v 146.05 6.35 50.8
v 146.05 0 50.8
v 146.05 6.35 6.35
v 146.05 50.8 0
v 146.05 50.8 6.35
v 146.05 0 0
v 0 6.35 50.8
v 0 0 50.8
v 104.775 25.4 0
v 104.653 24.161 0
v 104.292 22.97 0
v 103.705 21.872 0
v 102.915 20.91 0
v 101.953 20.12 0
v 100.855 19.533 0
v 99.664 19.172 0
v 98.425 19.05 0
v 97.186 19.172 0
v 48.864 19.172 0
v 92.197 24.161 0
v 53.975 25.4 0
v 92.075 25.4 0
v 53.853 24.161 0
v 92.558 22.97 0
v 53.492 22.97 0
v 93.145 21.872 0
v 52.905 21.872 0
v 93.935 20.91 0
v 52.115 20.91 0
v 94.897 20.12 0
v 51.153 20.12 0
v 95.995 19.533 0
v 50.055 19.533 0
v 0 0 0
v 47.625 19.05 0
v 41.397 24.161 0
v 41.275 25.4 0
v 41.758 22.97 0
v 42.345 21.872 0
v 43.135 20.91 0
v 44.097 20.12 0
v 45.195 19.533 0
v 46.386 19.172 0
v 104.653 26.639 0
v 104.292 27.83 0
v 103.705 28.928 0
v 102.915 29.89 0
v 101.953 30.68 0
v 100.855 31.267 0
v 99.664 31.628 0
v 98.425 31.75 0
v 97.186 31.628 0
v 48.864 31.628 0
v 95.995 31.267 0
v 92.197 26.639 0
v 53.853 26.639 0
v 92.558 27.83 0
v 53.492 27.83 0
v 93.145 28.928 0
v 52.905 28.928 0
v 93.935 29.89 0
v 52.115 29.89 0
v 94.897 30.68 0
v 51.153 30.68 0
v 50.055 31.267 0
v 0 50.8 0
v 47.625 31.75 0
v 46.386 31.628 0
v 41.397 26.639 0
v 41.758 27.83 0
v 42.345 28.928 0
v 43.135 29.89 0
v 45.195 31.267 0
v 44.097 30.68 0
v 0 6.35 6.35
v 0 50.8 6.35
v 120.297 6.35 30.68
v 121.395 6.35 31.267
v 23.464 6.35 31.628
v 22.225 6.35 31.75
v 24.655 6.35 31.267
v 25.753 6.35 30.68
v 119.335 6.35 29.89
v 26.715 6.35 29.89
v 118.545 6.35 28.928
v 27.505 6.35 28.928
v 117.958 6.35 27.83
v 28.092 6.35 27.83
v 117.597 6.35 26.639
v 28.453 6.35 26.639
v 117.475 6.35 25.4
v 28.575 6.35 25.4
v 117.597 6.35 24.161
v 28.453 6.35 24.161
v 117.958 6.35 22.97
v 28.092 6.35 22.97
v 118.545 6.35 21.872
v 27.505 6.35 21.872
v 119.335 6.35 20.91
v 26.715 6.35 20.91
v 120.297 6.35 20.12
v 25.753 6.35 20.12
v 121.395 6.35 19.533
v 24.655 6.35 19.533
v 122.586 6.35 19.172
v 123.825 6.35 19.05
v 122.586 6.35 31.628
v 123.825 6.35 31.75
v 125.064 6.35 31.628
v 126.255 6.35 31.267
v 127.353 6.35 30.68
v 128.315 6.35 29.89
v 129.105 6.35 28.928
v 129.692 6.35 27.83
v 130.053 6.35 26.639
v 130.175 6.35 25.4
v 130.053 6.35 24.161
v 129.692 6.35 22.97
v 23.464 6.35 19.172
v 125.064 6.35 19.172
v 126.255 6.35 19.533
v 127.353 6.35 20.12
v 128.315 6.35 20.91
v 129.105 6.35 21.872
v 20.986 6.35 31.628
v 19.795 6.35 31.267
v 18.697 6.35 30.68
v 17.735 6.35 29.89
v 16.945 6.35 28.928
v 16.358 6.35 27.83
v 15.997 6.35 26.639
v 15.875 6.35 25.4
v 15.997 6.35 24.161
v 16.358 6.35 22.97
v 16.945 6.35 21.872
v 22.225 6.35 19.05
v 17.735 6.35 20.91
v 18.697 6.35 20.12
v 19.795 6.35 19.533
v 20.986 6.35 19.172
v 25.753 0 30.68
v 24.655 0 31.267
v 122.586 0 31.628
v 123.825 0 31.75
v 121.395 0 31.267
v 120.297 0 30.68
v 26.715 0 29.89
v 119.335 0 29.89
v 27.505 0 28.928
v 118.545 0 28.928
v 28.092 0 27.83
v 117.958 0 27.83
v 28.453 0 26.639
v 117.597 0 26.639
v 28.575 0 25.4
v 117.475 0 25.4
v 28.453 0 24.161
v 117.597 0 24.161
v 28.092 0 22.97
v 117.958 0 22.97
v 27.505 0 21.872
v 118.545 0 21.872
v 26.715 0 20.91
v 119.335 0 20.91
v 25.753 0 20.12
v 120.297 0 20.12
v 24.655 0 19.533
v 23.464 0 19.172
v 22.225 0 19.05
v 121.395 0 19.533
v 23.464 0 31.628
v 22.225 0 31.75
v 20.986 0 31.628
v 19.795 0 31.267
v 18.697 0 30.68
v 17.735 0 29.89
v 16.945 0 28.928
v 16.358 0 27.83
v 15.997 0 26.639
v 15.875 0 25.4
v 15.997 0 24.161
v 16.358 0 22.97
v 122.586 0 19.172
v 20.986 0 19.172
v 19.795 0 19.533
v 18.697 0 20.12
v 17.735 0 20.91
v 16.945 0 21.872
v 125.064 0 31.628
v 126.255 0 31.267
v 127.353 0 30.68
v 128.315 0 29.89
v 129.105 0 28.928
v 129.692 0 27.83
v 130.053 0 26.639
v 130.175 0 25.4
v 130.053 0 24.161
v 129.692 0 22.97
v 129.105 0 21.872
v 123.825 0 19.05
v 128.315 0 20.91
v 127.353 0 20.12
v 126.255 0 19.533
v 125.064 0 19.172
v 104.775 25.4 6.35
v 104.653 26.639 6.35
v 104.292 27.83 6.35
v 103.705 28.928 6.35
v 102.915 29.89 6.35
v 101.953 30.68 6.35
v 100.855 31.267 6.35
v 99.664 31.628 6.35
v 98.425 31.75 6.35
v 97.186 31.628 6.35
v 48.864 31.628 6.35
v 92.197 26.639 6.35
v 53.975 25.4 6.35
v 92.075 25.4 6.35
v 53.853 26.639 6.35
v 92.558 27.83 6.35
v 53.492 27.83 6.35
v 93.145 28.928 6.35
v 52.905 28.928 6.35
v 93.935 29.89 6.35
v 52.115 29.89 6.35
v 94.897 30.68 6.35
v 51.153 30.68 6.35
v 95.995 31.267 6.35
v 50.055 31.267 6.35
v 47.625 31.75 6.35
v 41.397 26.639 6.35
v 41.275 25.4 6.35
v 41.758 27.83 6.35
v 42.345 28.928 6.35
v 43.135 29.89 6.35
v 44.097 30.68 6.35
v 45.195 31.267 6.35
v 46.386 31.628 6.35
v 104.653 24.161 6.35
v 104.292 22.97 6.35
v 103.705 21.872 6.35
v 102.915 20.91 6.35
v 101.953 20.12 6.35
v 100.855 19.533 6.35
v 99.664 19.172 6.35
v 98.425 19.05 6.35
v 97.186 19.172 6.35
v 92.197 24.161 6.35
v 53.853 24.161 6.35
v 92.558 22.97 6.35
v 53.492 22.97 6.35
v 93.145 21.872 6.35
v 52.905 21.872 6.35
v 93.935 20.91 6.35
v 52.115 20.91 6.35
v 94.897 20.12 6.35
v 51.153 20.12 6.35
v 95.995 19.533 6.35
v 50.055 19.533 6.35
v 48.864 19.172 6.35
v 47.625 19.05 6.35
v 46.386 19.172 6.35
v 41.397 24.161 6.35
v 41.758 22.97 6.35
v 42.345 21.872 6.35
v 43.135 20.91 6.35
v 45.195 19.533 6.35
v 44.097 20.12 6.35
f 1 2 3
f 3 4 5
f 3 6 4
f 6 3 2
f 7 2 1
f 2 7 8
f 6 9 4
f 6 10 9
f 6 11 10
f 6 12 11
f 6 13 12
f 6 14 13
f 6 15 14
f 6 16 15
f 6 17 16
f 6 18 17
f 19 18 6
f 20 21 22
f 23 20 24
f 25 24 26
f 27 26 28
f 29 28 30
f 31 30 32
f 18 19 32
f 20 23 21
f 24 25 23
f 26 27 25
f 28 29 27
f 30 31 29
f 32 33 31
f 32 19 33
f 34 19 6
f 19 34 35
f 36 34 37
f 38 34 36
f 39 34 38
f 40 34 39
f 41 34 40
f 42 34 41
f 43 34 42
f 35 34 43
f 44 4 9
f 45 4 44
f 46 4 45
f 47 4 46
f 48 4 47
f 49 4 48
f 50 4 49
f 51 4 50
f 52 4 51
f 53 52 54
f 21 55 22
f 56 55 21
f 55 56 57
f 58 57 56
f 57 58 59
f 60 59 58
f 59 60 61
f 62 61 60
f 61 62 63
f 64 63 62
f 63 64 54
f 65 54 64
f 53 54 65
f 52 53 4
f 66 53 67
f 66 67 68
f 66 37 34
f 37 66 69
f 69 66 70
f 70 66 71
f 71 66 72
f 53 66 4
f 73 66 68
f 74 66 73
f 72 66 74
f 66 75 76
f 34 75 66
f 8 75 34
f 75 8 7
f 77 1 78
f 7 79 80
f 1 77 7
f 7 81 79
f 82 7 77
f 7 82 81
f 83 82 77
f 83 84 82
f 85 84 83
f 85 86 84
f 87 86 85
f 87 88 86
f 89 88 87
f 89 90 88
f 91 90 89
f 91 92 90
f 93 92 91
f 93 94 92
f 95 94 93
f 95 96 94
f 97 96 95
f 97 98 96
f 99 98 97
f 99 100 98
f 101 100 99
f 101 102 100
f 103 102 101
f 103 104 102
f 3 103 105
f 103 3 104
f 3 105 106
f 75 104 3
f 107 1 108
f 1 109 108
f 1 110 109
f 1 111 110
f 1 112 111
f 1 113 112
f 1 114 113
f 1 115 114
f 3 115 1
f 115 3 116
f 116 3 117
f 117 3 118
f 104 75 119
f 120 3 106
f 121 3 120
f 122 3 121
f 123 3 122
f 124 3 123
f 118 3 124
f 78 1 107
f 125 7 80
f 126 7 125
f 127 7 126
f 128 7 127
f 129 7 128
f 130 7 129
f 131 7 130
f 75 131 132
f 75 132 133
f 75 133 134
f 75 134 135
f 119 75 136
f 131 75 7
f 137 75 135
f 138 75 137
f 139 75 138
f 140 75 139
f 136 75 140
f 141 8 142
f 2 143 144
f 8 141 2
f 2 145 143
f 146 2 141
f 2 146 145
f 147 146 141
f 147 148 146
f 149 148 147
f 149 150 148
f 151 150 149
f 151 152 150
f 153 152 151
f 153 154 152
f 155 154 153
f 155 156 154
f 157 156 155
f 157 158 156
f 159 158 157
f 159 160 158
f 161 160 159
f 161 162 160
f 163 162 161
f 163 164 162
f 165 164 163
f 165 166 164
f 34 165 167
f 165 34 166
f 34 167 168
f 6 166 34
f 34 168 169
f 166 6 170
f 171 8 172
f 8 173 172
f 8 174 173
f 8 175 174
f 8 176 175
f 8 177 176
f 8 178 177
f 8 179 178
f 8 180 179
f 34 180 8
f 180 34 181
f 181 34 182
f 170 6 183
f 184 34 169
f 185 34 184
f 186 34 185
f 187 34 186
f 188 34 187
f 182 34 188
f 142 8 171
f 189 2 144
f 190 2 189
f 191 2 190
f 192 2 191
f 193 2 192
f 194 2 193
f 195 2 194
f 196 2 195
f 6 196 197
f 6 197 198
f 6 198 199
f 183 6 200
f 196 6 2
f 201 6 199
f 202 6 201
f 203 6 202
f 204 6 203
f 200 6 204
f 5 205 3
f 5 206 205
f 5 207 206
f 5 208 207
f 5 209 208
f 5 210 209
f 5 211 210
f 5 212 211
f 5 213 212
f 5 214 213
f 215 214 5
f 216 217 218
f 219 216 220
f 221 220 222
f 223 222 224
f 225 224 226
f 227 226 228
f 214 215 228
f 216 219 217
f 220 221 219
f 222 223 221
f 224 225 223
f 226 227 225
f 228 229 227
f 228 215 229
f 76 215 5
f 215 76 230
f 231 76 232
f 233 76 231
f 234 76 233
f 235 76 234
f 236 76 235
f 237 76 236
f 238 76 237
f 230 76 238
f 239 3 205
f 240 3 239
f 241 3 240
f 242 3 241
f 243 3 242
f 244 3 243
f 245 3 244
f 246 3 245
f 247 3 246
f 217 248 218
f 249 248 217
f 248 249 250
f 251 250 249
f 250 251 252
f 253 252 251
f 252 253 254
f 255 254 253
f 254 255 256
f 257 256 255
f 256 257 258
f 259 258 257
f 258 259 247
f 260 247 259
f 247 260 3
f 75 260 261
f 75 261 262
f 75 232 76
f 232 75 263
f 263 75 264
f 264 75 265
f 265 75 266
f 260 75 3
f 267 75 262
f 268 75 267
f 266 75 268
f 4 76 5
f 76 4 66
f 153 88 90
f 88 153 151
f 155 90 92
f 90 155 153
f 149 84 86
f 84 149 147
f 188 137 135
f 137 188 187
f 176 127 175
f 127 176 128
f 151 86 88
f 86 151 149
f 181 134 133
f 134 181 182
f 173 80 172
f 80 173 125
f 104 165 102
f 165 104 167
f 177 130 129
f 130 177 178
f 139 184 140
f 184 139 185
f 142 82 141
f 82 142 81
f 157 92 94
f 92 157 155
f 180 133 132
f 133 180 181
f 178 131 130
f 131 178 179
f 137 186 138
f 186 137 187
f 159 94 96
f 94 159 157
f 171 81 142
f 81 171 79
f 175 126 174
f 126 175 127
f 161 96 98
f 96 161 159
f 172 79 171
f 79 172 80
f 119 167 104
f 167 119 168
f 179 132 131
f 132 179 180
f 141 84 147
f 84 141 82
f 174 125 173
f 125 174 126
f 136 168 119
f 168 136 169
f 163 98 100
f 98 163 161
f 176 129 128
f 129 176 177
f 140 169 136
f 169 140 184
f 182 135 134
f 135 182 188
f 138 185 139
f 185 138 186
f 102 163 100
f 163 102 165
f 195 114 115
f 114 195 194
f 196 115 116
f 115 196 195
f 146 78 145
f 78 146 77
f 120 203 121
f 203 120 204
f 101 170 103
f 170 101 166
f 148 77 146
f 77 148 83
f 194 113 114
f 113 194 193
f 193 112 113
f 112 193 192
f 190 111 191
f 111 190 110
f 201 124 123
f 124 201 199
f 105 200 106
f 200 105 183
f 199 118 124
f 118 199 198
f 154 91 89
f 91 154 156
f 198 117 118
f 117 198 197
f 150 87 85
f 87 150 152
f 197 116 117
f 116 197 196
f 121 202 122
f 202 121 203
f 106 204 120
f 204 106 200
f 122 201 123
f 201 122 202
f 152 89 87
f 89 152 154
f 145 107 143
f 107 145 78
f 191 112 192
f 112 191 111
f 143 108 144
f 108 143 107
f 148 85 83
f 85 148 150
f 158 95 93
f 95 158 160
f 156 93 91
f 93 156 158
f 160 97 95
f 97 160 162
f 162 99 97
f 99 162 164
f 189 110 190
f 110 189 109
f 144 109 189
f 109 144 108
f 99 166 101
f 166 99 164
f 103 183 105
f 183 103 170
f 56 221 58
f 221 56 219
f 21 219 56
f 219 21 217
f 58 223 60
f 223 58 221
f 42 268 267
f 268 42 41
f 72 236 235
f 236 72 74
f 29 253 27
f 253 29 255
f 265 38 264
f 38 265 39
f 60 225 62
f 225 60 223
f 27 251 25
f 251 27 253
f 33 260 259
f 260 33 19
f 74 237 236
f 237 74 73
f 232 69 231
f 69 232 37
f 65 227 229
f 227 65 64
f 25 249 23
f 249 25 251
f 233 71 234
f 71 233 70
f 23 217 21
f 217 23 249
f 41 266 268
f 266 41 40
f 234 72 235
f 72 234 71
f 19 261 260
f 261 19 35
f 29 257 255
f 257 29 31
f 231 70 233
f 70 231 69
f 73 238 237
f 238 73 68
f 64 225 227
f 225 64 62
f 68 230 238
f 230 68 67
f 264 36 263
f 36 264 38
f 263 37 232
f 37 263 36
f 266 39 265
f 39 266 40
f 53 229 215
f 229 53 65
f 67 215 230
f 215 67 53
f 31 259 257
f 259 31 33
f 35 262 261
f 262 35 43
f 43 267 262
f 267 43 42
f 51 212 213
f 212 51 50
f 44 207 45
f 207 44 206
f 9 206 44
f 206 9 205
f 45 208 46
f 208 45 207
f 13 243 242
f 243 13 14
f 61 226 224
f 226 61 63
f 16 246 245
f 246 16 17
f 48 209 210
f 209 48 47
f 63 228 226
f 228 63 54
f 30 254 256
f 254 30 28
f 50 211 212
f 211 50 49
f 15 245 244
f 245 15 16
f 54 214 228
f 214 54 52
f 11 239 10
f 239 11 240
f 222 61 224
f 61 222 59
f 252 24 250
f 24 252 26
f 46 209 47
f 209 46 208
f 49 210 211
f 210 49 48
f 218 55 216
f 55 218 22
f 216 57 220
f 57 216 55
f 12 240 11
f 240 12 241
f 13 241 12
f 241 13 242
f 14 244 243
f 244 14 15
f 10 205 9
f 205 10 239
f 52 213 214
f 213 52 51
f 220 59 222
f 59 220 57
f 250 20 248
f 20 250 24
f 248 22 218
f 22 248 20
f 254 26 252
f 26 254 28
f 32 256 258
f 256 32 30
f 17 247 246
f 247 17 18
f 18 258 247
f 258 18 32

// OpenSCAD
// Part A5: Arm Crossbeam Mount Angle Iron
// Material: 2"×2"×1/4" Angle Iron (50.8mm × 6.35mm)
// Quantity: 4 pieces (2 per arm, top and bottom)
// Location: Connecting arm side plates to cross beam
//
// Mounts the 2×6 cross beam to the loader arm side plates.
// Same dimensions as frame tube mount (A4) but used on the arms.

include <../../lifetrac_v25_params.scad>

// =============================================================================
// PART DIMENSIONS
// =============================================================================

// Crossbeam is 6" (152.4mm) in one dimension
_angle_trim = 3.175;  // 1/8" trim from each end

PART_A5_HEIGHT = 152.4 - 2 * _angle_trim;  // 146.05mm (5.75")
PART_A5_LEG = 50.8;
PART_A5_THICK = 6.35;
PART_A5_BOLT_DIA = 12.7;  // 1/2" bolts

// Hole spacing
_plate_bolt_offset = 50.8;  // 2" from center for plate side
_beam_bolt_offset = 25.4;   // 1" from center for beam side
_center_z = PART_A5_HEIGHT / 2;

PART_A5_HOLES_LEG_A = [_center_z - _plate_bolt_offset, _center_z + _plate_bolt_offset];
PART_A5_HOLES_LEG_B = [_center_z - _beam_bolt_offset, _center_z + _beam_bolt_offset];

// =============================================================================
// MAIN MODULE
// =============================================================================

/**
 * Part A5: Arm Crossbeam Mount Angle Iron
 * 
 * Same hole pattern as frame tube mount but used on loader arms.
 * Installed with:
 *   - Vertical leg against arm side plate
 *   - Horizontal leg against cross beam
 */
module _part_a5_arm_crossbeam_mount(show_holes=true) {
    height = PART_A5_HEIGHT;
    leg = PART_A5_LEG;
    thick = PART_A5_THICK;
    bolt_dia = PART_A5_BOLT_DIA;
    
    color("DarkGray")
    difference() {
        union() {
            // Vertical leg (against plate)
            cube([height, thick, leg]);
            // Horizontal leg (against beam)
            cube([height, leg, thick]);
        }
        
        if (show_holes) {
            // Holes in vertical leg (plate bolts)
            for (x = PART_A5_HOLES_LEG_A) {
                translate([x, thick + 1, leg/2])
                rotate([90, 0, 0])
                cylinder(d=bolt_dia, h=thick+2, $fn=32);
            }
            
            // Holes in horizontal leg (beam bolts)
            for (x = PART_A5_HOLES_LEG_B) {
                translate([x, leg/2, -1])
                cylinder(d=bolt_dia, h=thick+2, $fn=32);
            }
        }
    }
}

// =============================================================================
// RENDER
// =============================================================================

_part_a5_arm_crossbeam_mount(show_holes=true);

echo("=== PART A5: Arm Crossbeam Mount Angle Iron ===");
echo("Height:", PART_A5_HEIGHT, "mm");
echo("Bolt diameter:", PART_A5_BOLT_DIA, "mm (1/2\")");
echo("Plate side spacing: 4\" (101.6mm)");
echo("Beam side spacing: 2\" (50.8mm)");
echo("Quantity needed: 4 pieces");
